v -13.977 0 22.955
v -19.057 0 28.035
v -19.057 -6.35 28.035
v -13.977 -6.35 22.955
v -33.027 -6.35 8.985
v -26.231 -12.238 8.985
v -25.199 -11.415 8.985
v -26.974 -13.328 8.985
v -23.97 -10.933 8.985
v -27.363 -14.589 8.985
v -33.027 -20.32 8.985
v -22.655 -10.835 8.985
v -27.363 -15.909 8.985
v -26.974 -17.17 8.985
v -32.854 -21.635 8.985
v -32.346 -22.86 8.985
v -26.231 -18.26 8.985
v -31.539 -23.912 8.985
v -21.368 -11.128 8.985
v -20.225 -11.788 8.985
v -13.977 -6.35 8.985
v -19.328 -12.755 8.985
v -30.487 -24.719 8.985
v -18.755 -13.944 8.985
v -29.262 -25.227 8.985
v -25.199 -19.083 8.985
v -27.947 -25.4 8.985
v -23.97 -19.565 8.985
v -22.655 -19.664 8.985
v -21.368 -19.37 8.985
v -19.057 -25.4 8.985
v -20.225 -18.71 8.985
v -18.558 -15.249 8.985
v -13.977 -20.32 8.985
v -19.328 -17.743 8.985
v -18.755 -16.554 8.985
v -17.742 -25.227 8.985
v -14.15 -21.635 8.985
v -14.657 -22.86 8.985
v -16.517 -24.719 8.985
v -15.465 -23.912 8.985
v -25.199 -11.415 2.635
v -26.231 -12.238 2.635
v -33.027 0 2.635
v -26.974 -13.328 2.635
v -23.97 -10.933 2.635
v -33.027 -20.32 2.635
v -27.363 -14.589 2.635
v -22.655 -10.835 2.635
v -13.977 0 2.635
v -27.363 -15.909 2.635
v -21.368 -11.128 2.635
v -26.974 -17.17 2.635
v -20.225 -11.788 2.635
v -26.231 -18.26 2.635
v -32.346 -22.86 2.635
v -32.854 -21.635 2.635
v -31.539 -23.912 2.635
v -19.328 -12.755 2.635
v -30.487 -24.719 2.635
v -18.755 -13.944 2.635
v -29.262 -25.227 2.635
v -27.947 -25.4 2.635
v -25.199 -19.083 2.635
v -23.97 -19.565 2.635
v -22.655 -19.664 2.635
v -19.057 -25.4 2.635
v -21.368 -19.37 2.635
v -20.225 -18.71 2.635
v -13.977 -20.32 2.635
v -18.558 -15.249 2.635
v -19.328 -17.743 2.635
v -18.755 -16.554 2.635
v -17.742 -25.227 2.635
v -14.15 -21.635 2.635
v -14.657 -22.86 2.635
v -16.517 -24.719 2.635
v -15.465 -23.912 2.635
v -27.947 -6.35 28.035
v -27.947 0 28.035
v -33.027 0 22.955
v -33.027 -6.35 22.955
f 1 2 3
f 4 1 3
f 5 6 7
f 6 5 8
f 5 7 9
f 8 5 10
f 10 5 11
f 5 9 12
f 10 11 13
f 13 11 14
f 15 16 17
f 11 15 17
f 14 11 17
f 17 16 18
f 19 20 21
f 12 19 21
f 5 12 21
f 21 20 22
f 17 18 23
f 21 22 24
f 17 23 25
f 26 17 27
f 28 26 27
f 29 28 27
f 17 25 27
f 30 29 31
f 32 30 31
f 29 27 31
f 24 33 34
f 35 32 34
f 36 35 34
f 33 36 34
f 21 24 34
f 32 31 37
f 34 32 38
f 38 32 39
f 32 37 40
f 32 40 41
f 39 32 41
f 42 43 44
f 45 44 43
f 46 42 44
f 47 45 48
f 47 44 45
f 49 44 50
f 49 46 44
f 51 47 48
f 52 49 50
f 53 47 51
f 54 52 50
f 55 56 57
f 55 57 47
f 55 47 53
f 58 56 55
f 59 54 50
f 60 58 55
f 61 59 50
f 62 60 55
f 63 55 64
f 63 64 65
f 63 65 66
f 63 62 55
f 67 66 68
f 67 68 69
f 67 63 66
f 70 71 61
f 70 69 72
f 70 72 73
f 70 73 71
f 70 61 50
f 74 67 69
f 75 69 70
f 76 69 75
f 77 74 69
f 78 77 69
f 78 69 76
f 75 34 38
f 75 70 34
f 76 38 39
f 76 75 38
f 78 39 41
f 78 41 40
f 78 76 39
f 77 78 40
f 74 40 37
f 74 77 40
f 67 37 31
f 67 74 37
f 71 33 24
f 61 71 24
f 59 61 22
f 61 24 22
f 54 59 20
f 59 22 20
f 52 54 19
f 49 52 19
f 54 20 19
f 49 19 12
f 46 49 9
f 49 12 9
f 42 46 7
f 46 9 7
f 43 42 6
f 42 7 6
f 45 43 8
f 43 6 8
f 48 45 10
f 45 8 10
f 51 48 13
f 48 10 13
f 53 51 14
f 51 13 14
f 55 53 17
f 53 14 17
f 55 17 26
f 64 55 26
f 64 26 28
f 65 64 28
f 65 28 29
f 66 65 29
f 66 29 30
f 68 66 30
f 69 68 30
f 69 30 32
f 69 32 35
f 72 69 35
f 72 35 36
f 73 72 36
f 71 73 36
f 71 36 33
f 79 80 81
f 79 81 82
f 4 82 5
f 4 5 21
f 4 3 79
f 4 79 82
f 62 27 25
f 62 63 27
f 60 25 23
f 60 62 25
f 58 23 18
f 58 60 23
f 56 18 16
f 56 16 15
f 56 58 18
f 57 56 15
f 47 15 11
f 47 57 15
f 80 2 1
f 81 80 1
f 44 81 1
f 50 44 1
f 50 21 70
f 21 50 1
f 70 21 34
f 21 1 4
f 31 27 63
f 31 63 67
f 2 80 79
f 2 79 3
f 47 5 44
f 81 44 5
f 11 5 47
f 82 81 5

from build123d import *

# Parameters (mm, degrees)
F0_W     = 19.05
F0_H     = 19.05
F1_DEPTH = 6.35
F2_W     = 19.05
F2_H     = 25.4
F3_DEPTH = 6.35
F4_R     = 5.08
F5_R     = 5.08
F6_SIZE  = 5.08
F7_R     = 4.42696
F8_DEPTH = 6.351


with BuildPart() as f1:
    # F0 (on Front) → F1 (new body)
    with BuildSketch(Plane.XZ):
        with Locations((-23.501792, 18.51008)):
            Rectangle(F0_W, F0_H)
    extrude(amount=F1_DEPTH)

    # F2 (on face) → F3 (join)
    with BuildSketch(Plane(origin=(0, 0, 8.98508), x_dir=(1, 0, 0), z_dir=(0, 0, -1))):
        with Locations((-23.501792, 12.7)):
            Rectangle(F2_W, F2_H)
    extrude(amount=F3_DEPTH)

    # F4
    f4_edges = [f1.edges().sort_by_distance(p)[0] for p in [
        (-13.976792, -25.4, 5.81008),
    ]]
    fillet(f4_edges, radius=F4_R)

    # F5
    f5_edges = [f1.edges().sort_by_distance(p)[0] for p in [
        (-33.026792, -25.4, 5.81008),
    ]]
    fillet(f5_edges, radius=F5_R)

    # F6
    f6_edges = [f1.edges().sort_by_distance(p)[0] for p in [
        (-13.976792, -3.175, 28.03508),
        (-33.026792, -3.175, 28.03508),
    ]]
    chamfer(f6_edges, length=F6_SIZE)

    # F7 (on face) → F8 (cut, through all)
    with BuildSketch(Plane.XY.offset(8.98508)):
        with Locations((-22.985389, -15.249236)):
            Circle(F7_R)
    extrude(amount=-F8_DEPTH, mode=Mode.SUBTRACT)


solid = f1.part
